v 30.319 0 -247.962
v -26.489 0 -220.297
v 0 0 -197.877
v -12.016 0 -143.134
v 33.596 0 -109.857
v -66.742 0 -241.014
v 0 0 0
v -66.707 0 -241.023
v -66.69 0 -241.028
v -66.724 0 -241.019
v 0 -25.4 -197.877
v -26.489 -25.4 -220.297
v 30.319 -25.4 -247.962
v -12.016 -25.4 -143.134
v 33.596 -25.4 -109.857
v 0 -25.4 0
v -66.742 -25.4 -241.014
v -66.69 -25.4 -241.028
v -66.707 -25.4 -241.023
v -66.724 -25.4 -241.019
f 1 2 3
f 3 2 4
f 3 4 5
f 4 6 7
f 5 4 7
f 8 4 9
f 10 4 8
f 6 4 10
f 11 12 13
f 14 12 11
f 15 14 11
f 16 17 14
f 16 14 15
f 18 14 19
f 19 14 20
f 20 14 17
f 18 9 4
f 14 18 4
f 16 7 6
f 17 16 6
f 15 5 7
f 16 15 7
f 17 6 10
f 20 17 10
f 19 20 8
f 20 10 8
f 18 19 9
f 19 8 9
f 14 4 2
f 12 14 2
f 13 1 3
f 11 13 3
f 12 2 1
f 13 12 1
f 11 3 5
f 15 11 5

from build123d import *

# Parameters (mm, degrees)
F2_DEPTH = 25.4


with BuildPart() as f2:
    # F1 (on face) → F2 (new body)
    with BuildSketch(Plane.XZ):
        with BuildLine():
            Line((33.595659, -109.857202), (0, 0))
            Line((0, 0), (-66.741718, -241.01392))
            ThreePointArc((-66.741718, -241.01392), (-66.715884, -241.021072), (-66.69005, -241.028222))
            Line((-66.69005, -241.028222), (-12.01611, -143.133894))
            Line((-12.01611, -143.133894), (-26.489001, -220.296562))
            Line((-26.489001, -220.296562), (30.318644, -247.961536))
            Line((30.318644, -247.961536), (0, -197.876692))
            Line((0, -197.876692), (33.595659, -109.857202))
        make_face()
    extrude(amount=F2_DEPTH)


solid = f2.part
